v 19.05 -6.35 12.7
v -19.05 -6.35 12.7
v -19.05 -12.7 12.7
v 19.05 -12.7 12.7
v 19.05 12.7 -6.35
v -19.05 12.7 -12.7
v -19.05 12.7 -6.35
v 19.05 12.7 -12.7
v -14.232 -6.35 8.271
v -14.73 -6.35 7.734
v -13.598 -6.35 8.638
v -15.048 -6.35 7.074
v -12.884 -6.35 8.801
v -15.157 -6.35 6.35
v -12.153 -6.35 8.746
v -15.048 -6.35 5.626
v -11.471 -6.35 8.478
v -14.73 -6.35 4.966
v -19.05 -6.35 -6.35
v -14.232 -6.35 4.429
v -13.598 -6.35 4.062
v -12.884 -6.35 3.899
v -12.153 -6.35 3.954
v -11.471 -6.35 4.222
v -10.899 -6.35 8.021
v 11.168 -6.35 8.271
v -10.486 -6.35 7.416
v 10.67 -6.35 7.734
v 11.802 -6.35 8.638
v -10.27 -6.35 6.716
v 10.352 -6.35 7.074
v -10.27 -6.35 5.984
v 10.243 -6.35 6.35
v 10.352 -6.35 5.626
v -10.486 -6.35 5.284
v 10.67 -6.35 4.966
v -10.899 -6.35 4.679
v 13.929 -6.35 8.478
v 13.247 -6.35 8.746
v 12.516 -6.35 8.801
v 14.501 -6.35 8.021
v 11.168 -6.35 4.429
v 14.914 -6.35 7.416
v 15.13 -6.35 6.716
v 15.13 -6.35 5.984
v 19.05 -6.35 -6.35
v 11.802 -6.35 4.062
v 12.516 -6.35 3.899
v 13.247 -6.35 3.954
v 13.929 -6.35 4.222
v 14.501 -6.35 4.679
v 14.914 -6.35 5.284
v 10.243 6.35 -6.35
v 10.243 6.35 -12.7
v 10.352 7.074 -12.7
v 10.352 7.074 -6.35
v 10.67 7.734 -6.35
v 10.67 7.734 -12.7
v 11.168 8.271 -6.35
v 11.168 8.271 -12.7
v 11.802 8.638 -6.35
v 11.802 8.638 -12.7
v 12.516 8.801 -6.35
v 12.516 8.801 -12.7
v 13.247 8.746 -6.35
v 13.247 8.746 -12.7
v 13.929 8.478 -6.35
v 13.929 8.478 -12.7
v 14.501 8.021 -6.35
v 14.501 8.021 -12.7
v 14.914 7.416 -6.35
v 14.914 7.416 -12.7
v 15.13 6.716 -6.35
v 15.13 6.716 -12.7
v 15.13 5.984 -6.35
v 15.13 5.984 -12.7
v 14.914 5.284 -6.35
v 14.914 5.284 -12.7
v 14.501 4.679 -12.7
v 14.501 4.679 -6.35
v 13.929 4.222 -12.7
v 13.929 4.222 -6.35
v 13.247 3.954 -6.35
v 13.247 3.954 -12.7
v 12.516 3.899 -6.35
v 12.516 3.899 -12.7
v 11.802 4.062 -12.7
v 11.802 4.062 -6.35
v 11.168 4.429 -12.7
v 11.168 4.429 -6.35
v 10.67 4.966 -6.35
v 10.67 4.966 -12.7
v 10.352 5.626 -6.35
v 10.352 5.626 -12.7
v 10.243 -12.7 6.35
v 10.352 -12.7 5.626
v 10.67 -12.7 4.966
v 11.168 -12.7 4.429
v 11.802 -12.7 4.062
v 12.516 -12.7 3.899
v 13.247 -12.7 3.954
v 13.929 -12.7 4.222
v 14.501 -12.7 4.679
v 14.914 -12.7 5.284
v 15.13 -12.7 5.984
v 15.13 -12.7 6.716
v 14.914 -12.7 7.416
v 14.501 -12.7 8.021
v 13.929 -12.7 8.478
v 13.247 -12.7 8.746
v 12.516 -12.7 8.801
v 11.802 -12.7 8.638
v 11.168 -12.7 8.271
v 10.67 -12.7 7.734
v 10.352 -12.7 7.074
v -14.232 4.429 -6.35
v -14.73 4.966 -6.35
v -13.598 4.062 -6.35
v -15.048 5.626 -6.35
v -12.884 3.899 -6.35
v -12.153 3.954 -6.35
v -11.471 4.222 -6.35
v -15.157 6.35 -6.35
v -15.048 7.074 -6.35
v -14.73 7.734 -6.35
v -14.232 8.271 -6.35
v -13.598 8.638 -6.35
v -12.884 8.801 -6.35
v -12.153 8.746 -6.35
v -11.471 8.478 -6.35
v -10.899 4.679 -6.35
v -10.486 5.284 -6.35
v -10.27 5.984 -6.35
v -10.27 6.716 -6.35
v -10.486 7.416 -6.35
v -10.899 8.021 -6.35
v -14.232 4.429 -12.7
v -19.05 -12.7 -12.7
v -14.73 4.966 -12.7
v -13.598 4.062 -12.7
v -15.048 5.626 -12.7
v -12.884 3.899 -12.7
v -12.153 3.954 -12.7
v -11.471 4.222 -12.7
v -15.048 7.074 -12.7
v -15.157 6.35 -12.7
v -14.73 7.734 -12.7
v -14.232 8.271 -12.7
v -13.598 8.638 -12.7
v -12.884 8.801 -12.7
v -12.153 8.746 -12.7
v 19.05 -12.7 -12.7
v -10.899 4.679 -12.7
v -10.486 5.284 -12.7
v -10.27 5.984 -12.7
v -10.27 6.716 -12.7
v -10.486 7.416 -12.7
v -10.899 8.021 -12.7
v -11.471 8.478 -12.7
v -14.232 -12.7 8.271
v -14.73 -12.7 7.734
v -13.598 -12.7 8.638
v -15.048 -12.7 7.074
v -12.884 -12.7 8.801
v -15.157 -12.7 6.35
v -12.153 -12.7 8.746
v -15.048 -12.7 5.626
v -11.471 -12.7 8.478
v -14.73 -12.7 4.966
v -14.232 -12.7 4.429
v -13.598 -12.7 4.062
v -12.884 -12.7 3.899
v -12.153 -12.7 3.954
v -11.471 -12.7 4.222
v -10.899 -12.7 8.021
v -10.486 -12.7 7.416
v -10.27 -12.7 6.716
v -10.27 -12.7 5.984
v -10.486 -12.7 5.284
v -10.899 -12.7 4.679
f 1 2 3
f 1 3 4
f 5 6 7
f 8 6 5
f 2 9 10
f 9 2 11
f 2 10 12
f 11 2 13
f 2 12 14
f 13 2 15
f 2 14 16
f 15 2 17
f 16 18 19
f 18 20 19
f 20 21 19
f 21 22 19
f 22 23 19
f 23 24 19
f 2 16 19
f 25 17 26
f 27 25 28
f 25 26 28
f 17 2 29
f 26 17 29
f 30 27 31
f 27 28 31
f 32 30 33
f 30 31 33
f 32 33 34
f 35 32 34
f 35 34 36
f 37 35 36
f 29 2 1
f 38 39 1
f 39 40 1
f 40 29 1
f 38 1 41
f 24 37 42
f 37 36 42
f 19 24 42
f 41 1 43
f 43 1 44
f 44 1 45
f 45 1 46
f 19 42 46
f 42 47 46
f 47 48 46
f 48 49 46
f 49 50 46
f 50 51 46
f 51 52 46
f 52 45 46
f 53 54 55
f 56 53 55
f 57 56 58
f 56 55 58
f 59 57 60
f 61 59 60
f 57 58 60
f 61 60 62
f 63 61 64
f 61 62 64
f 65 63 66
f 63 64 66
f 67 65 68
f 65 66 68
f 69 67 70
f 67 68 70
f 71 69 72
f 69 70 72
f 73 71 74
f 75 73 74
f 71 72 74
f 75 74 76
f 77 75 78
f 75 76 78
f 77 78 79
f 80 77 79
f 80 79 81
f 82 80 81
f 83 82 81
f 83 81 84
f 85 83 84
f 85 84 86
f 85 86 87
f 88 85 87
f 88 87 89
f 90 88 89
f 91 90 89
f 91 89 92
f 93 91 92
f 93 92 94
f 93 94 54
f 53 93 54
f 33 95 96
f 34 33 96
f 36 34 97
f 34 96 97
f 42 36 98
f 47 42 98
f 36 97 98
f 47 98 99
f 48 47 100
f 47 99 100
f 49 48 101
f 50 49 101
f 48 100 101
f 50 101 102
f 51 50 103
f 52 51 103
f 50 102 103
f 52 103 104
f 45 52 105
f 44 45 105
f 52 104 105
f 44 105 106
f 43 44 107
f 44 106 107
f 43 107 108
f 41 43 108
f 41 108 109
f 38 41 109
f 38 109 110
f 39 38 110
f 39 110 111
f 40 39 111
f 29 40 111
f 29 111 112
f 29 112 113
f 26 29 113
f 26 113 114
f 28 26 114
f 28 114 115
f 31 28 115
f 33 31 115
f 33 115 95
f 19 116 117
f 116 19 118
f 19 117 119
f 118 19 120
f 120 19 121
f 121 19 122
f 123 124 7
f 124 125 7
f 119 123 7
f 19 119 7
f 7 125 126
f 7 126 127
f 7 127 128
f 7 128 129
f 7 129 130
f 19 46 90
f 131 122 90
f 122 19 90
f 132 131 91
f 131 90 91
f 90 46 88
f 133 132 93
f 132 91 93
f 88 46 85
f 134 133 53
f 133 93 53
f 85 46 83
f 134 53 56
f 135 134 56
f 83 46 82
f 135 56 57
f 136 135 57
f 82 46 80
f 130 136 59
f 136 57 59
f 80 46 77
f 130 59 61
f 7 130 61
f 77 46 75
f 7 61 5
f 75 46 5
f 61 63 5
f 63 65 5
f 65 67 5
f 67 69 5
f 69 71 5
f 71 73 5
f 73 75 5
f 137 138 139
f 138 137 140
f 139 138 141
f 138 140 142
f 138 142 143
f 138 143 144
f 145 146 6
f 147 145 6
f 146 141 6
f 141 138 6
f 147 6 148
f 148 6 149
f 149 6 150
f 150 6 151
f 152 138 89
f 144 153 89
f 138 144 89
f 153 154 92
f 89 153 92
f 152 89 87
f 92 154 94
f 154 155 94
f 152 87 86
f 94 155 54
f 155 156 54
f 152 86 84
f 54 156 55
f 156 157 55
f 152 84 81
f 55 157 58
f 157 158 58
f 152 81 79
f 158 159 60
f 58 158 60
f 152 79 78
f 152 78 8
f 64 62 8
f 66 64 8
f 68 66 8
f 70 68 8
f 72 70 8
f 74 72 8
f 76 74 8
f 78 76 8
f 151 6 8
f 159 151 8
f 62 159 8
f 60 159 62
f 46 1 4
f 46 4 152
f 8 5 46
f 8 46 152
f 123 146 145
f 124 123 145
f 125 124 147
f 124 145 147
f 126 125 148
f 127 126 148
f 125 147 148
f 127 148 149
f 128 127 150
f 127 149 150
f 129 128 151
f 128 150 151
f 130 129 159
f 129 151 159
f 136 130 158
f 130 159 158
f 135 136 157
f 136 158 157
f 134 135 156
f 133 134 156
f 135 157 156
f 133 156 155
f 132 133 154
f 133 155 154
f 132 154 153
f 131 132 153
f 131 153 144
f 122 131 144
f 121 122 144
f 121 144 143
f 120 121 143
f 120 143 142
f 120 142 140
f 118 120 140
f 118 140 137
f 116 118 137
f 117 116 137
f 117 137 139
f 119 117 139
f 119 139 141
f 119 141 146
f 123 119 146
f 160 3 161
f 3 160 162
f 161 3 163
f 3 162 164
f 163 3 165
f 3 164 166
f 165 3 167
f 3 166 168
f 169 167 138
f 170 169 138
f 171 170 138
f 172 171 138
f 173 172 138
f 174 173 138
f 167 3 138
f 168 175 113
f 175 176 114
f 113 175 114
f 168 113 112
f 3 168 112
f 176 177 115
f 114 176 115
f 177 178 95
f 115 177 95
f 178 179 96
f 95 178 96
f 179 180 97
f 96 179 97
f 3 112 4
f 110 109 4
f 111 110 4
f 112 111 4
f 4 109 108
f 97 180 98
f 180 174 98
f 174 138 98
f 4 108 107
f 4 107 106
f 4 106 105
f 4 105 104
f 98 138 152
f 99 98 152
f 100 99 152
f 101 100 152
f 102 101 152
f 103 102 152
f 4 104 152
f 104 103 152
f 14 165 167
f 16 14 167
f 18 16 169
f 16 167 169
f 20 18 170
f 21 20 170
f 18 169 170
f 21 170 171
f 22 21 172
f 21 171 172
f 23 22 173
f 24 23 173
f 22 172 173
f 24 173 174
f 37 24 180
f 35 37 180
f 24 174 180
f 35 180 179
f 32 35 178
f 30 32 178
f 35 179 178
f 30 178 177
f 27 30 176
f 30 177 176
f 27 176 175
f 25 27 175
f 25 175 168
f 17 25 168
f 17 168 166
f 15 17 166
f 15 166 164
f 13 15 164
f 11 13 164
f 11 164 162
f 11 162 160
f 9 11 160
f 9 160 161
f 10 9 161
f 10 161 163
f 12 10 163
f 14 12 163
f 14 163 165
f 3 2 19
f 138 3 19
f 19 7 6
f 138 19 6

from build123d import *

# Parameters (mm, degrees)
SKETCH1_W                        = 38.1
SKETCH1_H                        = 25.4
BOSS_EXTRUDE1_DEPTH              = 12.7
CUT_EXTRUDE1_REACH               = 40.1
SKETCH2_W                        = 19.05
SKETCH2_H                        = 19.05
F_10_0_1935_DIAMETER_HOLE2_D     = 4.9149
F_10_0_1935_DIAMETER_HOLE2_DEPTH = 6.35
F_10_0_1935_DIAMETER_HOLE1_D     = 4.9149
F_10_0_1935_DIAMETER_HOLE1_DEPTH = 12.7
F_10_0_1935_DIAMETER_HOLE1_TIP   = 1.476584928


with BuildPart() as part:
    # Sketch1 → Boss-Extrude1 (new body, symmetric)
    with BuildSketch(Plane(origin=(0, 0, 0), x_dir=(1, 0, 0), z_dir=(0, 1, 0))):
        Rectangle(SKETCH1_W, SKETCH1_H)
    extrude(amount=BOSS_EXTRUDE1_DEPTH, both=True)

    # Sketch2 → Cut-Extrude1 (cut, up to next)
    with BuildSketch(Plane(origin=(19.05, 0, 0), x_dir=(0, 0, -1), z_dir=(1, 0, 0)), mode=Mode.PRIVATE) as cut_extrude1_sk1:
        with Locations((-3.175, 3.175)):
            Rectangle(SKETCH2_W, SKETCH2_H)
    cut_extrude1_tool1 = extrude(cut_extrude1_sk1.sketch, amount=-CUT_EXTRUDE1_REACH, mode=Mode.PRIVATE) & part.part
    add(cut_extrude1_tool1.solids().sort_by_distance((19.05, 3.175, 3.175))[0], mode=Mode.SUBTRACT)

    # #10 (0.1935) Diameter Hole2
    with Locations(Plane.XY.offset(-6.35)):
        with Locations((-12.7, 6.35), (12.7, 6.35)):
            Hole(F_10_0_1935_DIAMETER_HOLE2_D / 2, depth=F_10_0_1935_DIAMETER_HOLE2_DEPTH)

    # #10 (0.1935) Diameter Hole1
    with Locations(Plane(origin=(0, -6.35, 0), x_dir=(1, 0, 0), z_dir=(0, 1, 0))):
        with Locations((-12.7, -6.35), (12.7, -6.35)):
            Hole(F_10_0_1935_DIAMETER_HOLE1_D / 2, depth=F_10_0_1935_DIAMETER_HOLE1_DEPTH)
            with Locations((0, 0, -(F_10_0_1935_DIAMETER_HOLE1_DEPTH + F_10_0_1935_DIAMETER_HOLE1_TIP / 2))):  # 118° drill point
                Cone(0, F_10_0_1935_DIAMETER_HOLE1_D / 2, F_10_0_1935_DIAMETER_HOLE1_TIP, mode=Mode.SUBTRACT)


solid = part.part
